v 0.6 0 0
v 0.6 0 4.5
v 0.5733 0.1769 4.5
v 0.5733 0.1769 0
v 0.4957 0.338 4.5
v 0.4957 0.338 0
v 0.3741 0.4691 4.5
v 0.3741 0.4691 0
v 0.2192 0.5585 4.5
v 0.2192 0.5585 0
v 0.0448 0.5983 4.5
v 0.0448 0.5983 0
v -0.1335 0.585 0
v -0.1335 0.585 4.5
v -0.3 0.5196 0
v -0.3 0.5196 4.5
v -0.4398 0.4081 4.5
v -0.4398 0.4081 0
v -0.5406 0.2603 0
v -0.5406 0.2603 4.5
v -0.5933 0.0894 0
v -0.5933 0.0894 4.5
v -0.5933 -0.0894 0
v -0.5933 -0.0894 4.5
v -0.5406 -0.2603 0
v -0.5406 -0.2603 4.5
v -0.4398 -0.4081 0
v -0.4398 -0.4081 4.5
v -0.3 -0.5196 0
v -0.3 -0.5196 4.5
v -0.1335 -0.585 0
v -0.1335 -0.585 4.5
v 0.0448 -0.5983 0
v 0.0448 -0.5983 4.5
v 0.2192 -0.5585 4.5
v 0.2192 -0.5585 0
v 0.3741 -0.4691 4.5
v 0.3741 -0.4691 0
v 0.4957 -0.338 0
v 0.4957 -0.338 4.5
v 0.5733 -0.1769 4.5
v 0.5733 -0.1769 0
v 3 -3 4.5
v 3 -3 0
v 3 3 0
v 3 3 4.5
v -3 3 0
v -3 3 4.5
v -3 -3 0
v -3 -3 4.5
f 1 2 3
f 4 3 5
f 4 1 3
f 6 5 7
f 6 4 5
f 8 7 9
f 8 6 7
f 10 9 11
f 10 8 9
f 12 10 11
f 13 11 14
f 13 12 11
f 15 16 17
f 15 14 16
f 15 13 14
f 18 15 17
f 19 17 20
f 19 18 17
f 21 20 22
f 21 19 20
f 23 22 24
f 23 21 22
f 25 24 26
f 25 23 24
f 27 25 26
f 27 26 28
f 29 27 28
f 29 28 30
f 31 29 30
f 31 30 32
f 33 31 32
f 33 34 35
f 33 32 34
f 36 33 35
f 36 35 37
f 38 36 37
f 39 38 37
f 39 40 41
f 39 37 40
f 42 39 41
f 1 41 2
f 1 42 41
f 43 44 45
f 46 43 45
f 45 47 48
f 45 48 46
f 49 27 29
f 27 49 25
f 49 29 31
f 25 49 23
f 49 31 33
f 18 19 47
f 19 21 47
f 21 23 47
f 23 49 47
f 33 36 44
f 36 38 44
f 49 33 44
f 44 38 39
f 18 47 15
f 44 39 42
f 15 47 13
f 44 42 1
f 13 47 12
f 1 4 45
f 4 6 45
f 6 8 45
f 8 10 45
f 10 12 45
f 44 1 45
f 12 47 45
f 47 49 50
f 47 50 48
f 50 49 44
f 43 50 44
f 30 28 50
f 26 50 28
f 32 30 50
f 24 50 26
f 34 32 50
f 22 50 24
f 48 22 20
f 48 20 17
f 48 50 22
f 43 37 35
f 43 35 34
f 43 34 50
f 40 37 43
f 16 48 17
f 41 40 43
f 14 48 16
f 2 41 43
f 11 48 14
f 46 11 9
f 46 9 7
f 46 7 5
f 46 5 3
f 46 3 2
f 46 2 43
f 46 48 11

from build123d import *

# Parameters (mm, degrees)
CYLINDER_R     = 0.6
CYLINDER_DEPTH = 10
BOX008_W       = 6
BOX008_H       = 6
BOX008_DEPTH   = 4.5


with BuildPart() as hole:
    # Cylinder → Cylinder (new body)
    with BuildSketch(Plane.XY):
        Circle(CYLINDER_R)
    extrude(amount=CYLINDER_DEPTH)


with BuildPart() as stand_hole_cut:
    # Box008 → Box008 (new body)
    with BuildSketch(Plane(origin=(-3, -3, 0), x_dir=(1, 0, 0), z_dir=(0, 0, 1))):
        with Locations((3, 3)):
            Rectangle(BOX008_W, BOX008_H)
    extrude(amount=BOX008_DEPTH)

    # Cut003002: cut hole
    add(hole.part, mode=Mode.SUBTRACT)


solid = stand_hole_cut.part
